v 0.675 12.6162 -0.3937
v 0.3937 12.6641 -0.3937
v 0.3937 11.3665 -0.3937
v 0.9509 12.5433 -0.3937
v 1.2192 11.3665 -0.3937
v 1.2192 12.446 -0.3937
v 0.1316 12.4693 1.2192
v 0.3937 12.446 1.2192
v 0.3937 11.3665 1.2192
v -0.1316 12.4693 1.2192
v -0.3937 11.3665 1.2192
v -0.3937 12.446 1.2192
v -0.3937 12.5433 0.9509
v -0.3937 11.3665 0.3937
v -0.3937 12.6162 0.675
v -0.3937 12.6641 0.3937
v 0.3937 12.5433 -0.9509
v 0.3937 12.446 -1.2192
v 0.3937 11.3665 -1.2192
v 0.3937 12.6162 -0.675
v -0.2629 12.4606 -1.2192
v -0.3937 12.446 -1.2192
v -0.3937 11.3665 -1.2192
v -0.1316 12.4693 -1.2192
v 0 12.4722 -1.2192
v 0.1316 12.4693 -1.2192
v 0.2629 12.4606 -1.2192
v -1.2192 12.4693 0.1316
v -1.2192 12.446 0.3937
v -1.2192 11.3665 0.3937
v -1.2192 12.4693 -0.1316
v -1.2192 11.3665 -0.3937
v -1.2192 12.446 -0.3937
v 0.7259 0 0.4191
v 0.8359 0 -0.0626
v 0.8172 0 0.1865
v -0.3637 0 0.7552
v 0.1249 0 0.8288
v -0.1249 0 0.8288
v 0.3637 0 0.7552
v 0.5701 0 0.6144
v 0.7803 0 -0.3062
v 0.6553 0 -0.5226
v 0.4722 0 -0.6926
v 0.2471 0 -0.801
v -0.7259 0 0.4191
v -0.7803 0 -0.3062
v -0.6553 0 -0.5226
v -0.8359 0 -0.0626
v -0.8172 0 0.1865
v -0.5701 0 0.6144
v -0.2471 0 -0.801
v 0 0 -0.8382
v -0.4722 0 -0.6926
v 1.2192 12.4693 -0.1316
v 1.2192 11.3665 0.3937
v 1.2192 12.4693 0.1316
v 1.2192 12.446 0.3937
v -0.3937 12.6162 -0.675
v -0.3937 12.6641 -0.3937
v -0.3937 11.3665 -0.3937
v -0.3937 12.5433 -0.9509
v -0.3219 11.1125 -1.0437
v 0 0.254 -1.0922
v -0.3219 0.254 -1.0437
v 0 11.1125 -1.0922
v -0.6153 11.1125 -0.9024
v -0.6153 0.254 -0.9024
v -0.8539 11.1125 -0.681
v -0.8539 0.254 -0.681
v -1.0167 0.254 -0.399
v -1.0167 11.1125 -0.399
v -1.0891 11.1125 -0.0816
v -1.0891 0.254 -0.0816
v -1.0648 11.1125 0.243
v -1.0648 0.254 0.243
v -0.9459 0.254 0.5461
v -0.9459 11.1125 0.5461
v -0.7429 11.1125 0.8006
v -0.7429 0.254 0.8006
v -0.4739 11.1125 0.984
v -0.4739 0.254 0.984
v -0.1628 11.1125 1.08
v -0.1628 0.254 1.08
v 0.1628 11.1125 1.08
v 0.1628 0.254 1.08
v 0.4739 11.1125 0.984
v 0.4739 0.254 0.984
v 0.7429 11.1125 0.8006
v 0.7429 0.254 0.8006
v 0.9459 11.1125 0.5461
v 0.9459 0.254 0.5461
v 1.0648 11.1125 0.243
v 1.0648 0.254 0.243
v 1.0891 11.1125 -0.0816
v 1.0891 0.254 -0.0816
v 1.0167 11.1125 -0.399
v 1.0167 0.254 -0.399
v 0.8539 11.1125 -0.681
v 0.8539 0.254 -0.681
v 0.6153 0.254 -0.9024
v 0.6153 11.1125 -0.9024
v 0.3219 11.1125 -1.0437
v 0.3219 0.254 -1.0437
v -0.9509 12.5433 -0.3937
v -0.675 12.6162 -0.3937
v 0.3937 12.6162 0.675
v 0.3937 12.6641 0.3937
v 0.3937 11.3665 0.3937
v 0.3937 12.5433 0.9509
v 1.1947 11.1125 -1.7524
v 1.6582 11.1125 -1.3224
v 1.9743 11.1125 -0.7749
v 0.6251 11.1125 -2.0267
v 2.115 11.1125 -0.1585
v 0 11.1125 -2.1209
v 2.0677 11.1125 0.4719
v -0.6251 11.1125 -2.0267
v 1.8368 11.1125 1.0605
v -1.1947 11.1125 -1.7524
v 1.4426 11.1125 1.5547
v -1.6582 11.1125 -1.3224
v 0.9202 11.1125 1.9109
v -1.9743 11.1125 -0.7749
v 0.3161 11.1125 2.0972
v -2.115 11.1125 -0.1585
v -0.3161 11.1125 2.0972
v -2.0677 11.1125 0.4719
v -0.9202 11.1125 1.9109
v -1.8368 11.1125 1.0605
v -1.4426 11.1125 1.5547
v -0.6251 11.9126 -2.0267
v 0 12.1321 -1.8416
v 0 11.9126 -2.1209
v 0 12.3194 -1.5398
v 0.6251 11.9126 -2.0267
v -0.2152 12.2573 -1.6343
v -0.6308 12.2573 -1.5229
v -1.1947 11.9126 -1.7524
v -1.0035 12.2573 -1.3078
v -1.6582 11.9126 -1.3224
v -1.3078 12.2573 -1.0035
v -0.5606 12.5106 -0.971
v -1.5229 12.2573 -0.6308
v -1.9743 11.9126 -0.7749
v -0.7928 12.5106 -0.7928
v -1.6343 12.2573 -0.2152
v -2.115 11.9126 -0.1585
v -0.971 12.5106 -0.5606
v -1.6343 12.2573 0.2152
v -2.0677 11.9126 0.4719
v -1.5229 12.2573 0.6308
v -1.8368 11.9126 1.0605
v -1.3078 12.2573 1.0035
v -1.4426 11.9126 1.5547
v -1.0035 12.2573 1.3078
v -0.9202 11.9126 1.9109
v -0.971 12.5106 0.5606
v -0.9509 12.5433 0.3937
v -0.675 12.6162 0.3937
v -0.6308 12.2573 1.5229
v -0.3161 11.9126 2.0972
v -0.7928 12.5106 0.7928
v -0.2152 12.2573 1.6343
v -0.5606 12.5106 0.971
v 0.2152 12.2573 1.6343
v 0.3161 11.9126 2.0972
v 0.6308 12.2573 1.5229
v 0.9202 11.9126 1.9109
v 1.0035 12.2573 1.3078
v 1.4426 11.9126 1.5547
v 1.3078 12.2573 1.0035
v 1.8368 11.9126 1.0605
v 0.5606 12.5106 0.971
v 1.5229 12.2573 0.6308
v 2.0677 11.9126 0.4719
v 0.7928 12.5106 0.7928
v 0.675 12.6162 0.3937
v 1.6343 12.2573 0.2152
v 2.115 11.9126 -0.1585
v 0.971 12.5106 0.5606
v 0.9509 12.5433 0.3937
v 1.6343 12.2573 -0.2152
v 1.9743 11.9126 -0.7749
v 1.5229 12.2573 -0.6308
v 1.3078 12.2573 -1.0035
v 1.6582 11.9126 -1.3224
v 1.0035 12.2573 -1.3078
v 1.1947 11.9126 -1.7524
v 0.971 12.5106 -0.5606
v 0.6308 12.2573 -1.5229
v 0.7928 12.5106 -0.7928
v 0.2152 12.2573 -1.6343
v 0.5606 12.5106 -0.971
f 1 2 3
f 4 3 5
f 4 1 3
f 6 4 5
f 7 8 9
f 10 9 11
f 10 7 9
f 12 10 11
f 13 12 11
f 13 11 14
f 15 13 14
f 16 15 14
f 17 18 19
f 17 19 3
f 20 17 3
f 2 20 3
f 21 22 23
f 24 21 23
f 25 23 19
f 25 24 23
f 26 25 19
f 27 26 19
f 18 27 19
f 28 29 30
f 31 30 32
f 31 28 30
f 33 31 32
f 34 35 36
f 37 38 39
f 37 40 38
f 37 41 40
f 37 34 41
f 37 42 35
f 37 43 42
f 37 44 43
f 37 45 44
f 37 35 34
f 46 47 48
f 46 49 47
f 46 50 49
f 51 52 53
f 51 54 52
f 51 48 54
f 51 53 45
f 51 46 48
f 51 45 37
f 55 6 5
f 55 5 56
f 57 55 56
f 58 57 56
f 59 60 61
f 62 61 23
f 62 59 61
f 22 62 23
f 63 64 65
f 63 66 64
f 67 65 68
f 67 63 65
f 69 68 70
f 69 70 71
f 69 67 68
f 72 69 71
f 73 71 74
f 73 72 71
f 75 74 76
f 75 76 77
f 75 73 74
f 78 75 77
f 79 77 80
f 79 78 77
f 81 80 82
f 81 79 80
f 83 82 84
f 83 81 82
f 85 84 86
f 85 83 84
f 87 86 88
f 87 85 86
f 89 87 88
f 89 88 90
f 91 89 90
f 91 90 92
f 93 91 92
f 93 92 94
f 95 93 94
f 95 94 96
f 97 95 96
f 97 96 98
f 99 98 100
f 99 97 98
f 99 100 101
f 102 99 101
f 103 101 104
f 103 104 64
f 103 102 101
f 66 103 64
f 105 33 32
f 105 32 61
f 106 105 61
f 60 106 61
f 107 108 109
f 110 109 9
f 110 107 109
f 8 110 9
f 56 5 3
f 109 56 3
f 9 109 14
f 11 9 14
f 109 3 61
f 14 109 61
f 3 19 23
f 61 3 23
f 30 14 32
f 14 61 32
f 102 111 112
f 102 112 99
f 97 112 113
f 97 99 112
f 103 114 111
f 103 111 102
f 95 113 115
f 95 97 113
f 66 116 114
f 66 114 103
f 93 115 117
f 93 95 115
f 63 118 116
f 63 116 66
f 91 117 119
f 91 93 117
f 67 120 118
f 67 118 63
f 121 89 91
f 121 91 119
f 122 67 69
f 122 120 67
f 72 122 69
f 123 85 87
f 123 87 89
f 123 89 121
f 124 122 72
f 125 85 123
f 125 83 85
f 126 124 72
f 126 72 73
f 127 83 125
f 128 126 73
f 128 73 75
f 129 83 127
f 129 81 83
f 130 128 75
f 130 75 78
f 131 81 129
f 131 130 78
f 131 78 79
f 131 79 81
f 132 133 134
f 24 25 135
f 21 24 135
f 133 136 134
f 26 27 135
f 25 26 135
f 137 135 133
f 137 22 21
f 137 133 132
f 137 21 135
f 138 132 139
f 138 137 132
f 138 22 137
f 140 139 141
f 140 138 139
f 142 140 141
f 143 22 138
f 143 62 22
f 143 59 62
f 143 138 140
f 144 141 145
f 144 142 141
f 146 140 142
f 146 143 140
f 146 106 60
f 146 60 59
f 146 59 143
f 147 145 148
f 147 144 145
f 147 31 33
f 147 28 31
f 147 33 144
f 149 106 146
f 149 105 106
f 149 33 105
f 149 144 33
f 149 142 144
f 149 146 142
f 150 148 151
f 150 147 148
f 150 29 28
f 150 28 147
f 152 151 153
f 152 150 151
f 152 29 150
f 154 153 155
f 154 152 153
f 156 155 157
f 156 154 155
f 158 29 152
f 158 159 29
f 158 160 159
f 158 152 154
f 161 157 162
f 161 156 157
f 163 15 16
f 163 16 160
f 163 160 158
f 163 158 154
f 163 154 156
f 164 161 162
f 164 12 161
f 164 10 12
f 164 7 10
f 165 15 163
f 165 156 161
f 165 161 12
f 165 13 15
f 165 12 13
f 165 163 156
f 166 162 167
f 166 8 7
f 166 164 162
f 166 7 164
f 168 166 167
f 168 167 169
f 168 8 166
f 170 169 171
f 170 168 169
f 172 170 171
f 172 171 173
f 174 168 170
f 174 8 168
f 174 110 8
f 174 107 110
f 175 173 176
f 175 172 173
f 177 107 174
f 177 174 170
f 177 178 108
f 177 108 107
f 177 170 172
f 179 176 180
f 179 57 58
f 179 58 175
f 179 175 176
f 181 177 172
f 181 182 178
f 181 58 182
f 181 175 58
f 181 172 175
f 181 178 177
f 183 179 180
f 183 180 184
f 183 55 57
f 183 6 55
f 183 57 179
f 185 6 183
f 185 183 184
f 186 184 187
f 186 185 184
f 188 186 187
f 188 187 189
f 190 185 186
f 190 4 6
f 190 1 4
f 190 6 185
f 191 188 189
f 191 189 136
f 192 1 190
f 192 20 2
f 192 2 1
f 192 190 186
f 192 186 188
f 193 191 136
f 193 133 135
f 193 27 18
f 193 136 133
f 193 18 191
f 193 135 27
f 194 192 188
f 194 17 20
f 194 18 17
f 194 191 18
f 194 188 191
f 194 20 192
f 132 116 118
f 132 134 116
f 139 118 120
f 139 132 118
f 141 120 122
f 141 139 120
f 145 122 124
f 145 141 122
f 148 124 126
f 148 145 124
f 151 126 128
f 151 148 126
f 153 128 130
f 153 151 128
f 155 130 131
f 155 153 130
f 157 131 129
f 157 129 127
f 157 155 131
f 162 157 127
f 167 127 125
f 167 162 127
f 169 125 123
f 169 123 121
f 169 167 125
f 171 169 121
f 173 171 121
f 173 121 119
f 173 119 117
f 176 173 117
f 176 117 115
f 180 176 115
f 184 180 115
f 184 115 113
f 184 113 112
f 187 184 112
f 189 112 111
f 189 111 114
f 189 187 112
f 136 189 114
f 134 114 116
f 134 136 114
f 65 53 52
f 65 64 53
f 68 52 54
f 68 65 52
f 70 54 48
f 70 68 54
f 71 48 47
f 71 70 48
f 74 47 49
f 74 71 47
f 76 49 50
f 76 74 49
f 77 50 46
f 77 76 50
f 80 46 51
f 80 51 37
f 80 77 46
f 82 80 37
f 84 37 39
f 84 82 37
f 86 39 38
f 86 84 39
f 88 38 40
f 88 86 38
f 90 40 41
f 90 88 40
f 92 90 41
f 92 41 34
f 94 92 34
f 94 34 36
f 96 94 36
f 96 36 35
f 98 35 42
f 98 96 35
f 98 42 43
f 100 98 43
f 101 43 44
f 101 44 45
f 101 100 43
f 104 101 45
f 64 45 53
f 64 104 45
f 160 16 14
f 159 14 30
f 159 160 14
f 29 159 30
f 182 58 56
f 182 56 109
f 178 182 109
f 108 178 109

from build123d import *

# Parameters (mm, degrees)
CUT_EXTRUDE1_DEPTH = 1.3462


with BuildPart() as part:
    # Sketch1 → Revolve1 (revolve)
    with BuildSketch(Plane.XY, mode=Mode.PRIVATE) as revolve1_sk:
        with BuildLine():
            Line((0, 12.7127), (0, 0))
            Line((0, 0), (0.8382, 0))
            Line((0.8382, 0), (1.0922, 0.254))
            Line((1.0922, 0.254), (1.0922, 11.1125))
            Line((1.0922, 11.1125), (2.1209, 11.1125))
            Line((2.1209, 11.1125), (2.1209, 11.9126))
            ThreePointArc((2.1209, 11.9126), (1.133399402, 12.506023812), (0, 12.7127))
        make_face()
    revolve(revolve1_sk.sketch.rotate(Axis((0, 0, 0), (0, 1, 0)), 90), axis=Axis((0, 0, 0), (0, 1, 0)))

    # Sketch2 → Cut-Extrude1 (cut)
    with BuildSketch(Plane(origin=(0, 12.7127, 0), x_dir=(1, 0, 0), z_dir=(0, 1, 0))):
        Polygon((-0.3937, 0.3937), (-0.3937, 1.2192), (0.3937, 1.2192), (0.3937, 0.3937), (1.2192, 0.3937), (1.2192, -0.3937), (0.3937, -0.3937), (0.3937, -1.2192), (-0.3937, -1.2192), (-0.3937, -0.3937), (-1.2192, -0.3937), (-1.2192, 0.3937), align=None)
    extrude(amount=-CUT_EXTRUDE1_DEPTH, mode=Mode.SUBTRACT)


solid = part.part
